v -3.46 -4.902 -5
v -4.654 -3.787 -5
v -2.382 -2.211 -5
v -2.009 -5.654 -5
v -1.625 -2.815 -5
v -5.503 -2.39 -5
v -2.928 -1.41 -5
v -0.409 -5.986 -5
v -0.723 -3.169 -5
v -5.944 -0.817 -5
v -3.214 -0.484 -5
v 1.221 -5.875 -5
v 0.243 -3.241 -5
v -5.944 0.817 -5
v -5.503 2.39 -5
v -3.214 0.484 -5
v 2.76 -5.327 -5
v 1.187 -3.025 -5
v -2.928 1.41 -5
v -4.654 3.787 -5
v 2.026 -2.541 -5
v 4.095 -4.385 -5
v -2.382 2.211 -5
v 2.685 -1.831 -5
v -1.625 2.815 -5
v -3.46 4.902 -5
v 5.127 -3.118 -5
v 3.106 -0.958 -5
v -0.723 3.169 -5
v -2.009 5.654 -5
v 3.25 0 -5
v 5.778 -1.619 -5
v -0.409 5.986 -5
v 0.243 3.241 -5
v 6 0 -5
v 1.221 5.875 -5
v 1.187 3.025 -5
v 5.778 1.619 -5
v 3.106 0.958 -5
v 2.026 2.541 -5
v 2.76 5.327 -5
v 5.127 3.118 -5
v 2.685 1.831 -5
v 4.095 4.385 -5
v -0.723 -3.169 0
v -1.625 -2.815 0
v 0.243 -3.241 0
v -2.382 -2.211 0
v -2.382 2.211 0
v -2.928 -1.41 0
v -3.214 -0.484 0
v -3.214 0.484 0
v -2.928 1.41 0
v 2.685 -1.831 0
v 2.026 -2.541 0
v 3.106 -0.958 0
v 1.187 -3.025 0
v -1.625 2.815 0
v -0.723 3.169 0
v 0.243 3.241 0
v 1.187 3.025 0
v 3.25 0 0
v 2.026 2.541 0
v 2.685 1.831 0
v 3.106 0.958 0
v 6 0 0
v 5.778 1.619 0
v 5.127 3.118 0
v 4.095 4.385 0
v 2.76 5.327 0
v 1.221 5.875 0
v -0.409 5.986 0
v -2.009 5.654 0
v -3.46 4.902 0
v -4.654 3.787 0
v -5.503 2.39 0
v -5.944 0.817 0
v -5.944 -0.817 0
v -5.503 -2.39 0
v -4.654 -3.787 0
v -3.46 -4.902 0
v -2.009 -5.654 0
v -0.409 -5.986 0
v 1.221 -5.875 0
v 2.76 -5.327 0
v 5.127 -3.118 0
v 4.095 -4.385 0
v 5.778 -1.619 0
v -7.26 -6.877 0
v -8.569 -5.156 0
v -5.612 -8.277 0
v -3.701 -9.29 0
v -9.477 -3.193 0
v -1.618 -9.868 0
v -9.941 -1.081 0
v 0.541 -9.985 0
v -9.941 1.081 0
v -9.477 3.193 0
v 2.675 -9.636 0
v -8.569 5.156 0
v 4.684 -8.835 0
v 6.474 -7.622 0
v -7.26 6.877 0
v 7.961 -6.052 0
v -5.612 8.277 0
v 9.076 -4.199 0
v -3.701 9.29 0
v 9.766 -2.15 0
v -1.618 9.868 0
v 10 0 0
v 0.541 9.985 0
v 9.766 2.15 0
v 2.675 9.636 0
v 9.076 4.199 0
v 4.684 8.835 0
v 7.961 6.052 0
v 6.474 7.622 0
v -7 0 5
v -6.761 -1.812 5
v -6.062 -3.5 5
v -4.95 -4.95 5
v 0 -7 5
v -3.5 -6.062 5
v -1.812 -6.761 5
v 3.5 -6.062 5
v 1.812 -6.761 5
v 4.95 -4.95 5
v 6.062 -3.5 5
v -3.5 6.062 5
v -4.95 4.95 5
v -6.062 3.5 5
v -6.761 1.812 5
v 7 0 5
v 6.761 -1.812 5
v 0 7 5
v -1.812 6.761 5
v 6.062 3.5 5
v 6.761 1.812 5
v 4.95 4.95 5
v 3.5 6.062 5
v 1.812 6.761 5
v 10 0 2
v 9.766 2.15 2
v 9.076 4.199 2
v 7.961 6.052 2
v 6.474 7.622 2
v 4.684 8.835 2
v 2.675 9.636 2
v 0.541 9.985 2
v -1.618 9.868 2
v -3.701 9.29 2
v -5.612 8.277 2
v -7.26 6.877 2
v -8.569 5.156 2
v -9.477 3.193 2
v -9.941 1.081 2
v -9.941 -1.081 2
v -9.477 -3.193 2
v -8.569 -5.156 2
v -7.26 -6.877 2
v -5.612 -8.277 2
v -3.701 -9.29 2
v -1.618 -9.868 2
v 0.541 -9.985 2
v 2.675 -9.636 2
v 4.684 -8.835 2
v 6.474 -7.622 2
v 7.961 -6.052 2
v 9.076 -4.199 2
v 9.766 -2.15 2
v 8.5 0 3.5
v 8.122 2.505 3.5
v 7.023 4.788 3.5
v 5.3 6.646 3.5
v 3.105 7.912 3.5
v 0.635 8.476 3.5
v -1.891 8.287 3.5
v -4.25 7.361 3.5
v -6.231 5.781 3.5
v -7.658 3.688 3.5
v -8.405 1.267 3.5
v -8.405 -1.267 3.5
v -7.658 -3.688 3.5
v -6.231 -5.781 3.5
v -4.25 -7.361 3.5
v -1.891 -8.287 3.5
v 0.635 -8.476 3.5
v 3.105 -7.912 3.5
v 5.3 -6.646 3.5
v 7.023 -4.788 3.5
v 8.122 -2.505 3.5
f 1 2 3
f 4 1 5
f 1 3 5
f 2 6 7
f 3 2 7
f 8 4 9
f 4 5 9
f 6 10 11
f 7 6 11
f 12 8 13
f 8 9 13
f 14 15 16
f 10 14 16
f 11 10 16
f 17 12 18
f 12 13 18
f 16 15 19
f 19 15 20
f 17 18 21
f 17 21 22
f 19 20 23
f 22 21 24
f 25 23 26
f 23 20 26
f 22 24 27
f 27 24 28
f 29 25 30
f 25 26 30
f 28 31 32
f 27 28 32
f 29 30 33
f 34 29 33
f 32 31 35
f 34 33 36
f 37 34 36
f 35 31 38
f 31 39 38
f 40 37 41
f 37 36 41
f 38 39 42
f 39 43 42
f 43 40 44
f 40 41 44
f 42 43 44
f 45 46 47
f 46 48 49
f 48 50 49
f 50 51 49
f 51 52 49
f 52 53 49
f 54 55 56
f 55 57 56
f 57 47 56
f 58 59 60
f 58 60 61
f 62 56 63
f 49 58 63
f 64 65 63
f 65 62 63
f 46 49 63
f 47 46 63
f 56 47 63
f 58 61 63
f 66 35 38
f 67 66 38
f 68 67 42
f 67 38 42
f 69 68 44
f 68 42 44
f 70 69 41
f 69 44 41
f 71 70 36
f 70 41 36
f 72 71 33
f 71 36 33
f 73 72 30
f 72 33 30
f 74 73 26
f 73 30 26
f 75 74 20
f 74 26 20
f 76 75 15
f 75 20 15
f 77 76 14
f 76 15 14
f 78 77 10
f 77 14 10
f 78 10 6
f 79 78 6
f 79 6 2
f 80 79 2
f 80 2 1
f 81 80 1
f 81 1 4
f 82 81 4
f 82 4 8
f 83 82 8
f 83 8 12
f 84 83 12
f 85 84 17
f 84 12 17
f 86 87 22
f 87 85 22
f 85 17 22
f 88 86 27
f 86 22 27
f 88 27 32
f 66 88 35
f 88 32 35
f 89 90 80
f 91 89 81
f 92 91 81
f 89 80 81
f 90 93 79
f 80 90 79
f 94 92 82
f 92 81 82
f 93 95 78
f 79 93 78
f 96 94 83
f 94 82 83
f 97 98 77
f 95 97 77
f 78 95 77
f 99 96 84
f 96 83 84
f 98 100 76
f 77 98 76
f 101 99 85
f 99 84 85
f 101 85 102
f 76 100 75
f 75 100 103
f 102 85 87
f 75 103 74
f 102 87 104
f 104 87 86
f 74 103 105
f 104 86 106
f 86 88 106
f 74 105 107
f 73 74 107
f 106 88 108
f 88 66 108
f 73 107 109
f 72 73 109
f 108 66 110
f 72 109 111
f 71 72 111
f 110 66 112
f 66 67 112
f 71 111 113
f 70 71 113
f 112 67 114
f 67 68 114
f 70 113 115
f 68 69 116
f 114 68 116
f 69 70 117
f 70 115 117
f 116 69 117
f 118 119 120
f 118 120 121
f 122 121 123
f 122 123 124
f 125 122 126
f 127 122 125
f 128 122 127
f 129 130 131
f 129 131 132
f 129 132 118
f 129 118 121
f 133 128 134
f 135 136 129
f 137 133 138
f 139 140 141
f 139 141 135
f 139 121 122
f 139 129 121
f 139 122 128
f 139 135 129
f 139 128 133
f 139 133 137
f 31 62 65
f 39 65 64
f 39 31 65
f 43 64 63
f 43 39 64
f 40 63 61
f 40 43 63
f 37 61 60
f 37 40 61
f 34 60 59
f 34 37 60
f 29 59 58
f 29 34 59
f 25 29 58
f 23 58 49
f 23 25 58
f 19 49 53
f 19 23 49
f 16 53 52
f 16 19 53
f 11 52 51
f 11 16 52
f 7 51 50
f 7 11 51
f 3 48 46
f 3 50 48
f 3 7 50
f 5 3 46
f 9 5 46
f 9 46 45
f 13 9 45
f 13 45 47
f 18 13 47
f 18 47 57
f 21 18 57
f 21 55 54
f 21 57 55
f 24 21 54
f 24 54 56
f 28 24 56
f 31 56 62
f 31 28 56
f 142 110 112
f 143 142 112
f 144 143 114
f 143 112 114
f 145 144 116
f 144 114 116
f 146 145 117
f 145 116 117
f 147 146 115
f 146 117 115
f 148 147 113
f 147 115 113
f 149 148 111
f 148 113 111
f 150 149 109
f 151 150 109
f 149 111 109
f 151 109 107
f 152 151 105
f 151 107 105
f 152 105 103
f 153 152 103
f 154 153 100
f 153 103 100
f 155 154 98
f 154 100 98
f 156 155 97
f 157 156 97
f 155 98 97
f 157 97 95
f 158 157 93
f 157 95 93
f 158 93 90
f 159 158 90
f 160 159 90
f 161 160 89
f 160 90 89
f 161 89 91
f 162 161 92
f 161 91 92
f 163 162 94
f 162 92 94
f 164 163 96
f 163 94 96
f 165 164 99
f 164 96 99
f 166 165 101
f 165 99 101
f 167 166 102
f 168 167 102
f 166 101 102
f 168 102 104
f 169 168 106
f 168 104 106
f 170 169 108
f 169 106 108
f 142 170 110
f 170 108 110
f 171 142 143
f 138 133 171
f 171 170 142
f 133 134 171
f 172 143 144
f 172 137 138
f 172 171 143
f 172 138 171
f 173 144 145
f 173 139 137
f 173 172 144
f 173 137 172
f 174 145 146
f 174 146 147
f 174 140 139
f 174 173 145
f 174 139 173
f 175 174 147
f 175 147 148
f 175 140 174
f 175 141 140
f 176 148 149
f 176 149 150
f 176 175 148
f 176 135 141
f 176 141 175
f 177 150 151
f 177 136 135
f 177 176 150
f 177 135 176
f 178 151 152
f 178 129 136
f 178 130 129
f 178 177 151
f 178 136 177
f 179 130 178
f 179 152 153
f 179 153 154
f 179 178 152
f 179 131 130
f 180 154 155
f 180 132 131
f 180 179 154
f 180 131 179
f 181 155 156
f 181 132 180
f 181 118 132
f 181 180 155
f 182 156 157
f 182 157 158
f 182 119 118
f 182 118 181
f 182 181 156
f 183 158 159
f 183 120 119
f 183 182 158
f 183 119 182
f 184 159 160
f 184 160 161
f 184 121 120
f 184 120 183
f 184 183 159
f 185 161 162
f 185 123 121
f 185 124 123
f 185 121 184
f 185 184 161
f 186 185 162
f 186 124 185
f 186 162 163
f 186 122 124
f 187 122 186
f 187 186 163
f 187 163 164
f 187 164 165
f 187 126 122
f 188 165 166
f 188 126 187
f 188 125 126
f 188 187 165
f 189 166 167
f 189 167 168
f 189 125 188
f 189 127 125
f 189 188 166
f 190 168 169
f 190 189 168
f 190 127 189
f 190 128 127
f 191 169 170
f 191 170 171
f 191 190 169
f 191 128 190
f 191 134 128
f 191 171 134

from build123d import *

# Parameters (mm, degrees)
BOSS_EXTRUDE1_DEPTH      = 5
BOSS_EXTRUDE1_DEPTH_BACK = 5
SKETCH1_R                = 6
SKETCH1_R_2              = 3.25
SKETCH2_R                = 10.000000149
BOSS_EXTRUDE2_DEPTH      = 5
CHAMFER1_SIZE            = 3


with BuildPart() as part:
    # Sketch1 → Boss-Extrude1 (new, two sides: drawn at the far end of the back side and taken through both)
    with BuildSketch(Plane.XY.offset(-BOSS_EXTRUDE1_DEPTH_BACK)):
        Circle(SKETCH1_R)
        Circle(SKETCH1_R_2, mode=Mode.SUBTRACT)
    extrude(amount=BOSS_EXTRUDE1_DEPTH + BOSS_EXTRUDE1_DEPTH_BACK)

    # Sketch2 → Boss-Extrude2 (add)
    with BuildSketch(Plane.XY):
        Circle(SKETCH2_R)
    extrude(amount=BOSS_EXTRUDE2_DEPTH)

    # Chamfer1
    chamfer1_edges = [part.edges().sort_by_distance(p)[0] for p in [
        (-10.000000149, 0, 5),
    ]]
    chamfer(chamfer1_edges, length=CHAMFER1_SIZE)


solid = part.part
